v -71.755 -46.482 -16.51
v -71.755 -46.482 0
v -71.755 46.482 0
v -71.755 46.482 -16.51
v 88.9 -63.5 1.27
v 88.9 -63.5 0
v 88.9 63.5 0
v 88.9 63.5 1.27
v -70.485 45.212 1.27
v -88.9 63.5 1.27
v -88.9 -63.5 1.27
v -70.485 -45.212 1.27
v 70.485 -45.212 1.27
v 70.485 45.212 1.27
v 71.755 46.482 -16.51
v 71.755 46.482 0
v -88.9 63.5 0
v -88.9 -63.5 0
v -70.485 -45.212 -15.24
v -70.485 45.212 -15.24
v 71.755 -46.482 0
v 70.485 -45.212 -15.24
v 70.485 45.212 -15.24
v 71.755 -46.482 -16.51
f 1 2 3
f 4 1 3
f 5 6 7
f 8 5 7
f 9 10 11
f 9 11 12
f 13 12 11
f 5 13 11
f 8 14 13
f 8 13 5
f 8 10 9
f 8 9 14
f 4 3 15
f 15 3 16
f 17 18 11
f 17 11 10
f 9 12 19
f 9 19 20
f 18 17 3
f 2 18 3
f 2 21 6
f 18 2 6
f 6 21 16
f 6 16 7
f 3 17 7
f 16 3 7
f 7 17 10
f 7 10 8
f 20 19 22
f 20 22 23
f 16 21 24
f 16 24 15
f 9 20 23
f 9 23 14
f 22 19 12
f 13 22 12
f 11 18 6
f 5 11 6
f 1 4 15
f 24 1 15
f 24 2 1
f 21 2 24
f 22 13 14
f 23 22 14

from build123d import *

# Parameters (mm, degrees)
SKETCH1_W           = 143.51
SKETCH1_H           = 92.964
BOSS_EXTRUDE1_DEPTH = 16.51
SKETCH2_W           = 177.8
SKETCH2_H           = 127
BOSS_EXTRUDE2_DEPTH = 1.27
SHELL1_START        = -70.485
SHELL1_OUTLINE_W    = 90.424
SHELL1_OUTLINE_H    = 16.51
SHELL1_DEPTH        = 140.97


# Read off the part's stored shape, not the designer's step: Shell1
with BuildPart() as part:
    # Sketch1 → Boss-Extrude1 (new body)
    with BuildSketch(Plane.XY):
        Rectangle(SKETCH1_W, SKETCH1_H)
    extrude(amount=-BOSS_EXTRUDE1_DEPTH)

    # Sketch2 → Boss-Extrude2 (add)
    with BuildSketch(Plane.XY):
        Rectangle(SKETCH2_W, SKETCH2_H)
    extrude(amount=BOSS_EXTRUDE2_DEPTH)

    # Shell1 outline → Shell1 (cut)
    with BuildSketch(Plane.YZ.offset(SHELL1_START)):
        with Locations((0, -6.985)):
            Rectangle(SHELL1_OUTLINE_W, SHELL1_OUTLINE_H)
    extrude(amount=SHELL1_DEPTH, mode=Mode.SUBTRACT)


solid = part.part
